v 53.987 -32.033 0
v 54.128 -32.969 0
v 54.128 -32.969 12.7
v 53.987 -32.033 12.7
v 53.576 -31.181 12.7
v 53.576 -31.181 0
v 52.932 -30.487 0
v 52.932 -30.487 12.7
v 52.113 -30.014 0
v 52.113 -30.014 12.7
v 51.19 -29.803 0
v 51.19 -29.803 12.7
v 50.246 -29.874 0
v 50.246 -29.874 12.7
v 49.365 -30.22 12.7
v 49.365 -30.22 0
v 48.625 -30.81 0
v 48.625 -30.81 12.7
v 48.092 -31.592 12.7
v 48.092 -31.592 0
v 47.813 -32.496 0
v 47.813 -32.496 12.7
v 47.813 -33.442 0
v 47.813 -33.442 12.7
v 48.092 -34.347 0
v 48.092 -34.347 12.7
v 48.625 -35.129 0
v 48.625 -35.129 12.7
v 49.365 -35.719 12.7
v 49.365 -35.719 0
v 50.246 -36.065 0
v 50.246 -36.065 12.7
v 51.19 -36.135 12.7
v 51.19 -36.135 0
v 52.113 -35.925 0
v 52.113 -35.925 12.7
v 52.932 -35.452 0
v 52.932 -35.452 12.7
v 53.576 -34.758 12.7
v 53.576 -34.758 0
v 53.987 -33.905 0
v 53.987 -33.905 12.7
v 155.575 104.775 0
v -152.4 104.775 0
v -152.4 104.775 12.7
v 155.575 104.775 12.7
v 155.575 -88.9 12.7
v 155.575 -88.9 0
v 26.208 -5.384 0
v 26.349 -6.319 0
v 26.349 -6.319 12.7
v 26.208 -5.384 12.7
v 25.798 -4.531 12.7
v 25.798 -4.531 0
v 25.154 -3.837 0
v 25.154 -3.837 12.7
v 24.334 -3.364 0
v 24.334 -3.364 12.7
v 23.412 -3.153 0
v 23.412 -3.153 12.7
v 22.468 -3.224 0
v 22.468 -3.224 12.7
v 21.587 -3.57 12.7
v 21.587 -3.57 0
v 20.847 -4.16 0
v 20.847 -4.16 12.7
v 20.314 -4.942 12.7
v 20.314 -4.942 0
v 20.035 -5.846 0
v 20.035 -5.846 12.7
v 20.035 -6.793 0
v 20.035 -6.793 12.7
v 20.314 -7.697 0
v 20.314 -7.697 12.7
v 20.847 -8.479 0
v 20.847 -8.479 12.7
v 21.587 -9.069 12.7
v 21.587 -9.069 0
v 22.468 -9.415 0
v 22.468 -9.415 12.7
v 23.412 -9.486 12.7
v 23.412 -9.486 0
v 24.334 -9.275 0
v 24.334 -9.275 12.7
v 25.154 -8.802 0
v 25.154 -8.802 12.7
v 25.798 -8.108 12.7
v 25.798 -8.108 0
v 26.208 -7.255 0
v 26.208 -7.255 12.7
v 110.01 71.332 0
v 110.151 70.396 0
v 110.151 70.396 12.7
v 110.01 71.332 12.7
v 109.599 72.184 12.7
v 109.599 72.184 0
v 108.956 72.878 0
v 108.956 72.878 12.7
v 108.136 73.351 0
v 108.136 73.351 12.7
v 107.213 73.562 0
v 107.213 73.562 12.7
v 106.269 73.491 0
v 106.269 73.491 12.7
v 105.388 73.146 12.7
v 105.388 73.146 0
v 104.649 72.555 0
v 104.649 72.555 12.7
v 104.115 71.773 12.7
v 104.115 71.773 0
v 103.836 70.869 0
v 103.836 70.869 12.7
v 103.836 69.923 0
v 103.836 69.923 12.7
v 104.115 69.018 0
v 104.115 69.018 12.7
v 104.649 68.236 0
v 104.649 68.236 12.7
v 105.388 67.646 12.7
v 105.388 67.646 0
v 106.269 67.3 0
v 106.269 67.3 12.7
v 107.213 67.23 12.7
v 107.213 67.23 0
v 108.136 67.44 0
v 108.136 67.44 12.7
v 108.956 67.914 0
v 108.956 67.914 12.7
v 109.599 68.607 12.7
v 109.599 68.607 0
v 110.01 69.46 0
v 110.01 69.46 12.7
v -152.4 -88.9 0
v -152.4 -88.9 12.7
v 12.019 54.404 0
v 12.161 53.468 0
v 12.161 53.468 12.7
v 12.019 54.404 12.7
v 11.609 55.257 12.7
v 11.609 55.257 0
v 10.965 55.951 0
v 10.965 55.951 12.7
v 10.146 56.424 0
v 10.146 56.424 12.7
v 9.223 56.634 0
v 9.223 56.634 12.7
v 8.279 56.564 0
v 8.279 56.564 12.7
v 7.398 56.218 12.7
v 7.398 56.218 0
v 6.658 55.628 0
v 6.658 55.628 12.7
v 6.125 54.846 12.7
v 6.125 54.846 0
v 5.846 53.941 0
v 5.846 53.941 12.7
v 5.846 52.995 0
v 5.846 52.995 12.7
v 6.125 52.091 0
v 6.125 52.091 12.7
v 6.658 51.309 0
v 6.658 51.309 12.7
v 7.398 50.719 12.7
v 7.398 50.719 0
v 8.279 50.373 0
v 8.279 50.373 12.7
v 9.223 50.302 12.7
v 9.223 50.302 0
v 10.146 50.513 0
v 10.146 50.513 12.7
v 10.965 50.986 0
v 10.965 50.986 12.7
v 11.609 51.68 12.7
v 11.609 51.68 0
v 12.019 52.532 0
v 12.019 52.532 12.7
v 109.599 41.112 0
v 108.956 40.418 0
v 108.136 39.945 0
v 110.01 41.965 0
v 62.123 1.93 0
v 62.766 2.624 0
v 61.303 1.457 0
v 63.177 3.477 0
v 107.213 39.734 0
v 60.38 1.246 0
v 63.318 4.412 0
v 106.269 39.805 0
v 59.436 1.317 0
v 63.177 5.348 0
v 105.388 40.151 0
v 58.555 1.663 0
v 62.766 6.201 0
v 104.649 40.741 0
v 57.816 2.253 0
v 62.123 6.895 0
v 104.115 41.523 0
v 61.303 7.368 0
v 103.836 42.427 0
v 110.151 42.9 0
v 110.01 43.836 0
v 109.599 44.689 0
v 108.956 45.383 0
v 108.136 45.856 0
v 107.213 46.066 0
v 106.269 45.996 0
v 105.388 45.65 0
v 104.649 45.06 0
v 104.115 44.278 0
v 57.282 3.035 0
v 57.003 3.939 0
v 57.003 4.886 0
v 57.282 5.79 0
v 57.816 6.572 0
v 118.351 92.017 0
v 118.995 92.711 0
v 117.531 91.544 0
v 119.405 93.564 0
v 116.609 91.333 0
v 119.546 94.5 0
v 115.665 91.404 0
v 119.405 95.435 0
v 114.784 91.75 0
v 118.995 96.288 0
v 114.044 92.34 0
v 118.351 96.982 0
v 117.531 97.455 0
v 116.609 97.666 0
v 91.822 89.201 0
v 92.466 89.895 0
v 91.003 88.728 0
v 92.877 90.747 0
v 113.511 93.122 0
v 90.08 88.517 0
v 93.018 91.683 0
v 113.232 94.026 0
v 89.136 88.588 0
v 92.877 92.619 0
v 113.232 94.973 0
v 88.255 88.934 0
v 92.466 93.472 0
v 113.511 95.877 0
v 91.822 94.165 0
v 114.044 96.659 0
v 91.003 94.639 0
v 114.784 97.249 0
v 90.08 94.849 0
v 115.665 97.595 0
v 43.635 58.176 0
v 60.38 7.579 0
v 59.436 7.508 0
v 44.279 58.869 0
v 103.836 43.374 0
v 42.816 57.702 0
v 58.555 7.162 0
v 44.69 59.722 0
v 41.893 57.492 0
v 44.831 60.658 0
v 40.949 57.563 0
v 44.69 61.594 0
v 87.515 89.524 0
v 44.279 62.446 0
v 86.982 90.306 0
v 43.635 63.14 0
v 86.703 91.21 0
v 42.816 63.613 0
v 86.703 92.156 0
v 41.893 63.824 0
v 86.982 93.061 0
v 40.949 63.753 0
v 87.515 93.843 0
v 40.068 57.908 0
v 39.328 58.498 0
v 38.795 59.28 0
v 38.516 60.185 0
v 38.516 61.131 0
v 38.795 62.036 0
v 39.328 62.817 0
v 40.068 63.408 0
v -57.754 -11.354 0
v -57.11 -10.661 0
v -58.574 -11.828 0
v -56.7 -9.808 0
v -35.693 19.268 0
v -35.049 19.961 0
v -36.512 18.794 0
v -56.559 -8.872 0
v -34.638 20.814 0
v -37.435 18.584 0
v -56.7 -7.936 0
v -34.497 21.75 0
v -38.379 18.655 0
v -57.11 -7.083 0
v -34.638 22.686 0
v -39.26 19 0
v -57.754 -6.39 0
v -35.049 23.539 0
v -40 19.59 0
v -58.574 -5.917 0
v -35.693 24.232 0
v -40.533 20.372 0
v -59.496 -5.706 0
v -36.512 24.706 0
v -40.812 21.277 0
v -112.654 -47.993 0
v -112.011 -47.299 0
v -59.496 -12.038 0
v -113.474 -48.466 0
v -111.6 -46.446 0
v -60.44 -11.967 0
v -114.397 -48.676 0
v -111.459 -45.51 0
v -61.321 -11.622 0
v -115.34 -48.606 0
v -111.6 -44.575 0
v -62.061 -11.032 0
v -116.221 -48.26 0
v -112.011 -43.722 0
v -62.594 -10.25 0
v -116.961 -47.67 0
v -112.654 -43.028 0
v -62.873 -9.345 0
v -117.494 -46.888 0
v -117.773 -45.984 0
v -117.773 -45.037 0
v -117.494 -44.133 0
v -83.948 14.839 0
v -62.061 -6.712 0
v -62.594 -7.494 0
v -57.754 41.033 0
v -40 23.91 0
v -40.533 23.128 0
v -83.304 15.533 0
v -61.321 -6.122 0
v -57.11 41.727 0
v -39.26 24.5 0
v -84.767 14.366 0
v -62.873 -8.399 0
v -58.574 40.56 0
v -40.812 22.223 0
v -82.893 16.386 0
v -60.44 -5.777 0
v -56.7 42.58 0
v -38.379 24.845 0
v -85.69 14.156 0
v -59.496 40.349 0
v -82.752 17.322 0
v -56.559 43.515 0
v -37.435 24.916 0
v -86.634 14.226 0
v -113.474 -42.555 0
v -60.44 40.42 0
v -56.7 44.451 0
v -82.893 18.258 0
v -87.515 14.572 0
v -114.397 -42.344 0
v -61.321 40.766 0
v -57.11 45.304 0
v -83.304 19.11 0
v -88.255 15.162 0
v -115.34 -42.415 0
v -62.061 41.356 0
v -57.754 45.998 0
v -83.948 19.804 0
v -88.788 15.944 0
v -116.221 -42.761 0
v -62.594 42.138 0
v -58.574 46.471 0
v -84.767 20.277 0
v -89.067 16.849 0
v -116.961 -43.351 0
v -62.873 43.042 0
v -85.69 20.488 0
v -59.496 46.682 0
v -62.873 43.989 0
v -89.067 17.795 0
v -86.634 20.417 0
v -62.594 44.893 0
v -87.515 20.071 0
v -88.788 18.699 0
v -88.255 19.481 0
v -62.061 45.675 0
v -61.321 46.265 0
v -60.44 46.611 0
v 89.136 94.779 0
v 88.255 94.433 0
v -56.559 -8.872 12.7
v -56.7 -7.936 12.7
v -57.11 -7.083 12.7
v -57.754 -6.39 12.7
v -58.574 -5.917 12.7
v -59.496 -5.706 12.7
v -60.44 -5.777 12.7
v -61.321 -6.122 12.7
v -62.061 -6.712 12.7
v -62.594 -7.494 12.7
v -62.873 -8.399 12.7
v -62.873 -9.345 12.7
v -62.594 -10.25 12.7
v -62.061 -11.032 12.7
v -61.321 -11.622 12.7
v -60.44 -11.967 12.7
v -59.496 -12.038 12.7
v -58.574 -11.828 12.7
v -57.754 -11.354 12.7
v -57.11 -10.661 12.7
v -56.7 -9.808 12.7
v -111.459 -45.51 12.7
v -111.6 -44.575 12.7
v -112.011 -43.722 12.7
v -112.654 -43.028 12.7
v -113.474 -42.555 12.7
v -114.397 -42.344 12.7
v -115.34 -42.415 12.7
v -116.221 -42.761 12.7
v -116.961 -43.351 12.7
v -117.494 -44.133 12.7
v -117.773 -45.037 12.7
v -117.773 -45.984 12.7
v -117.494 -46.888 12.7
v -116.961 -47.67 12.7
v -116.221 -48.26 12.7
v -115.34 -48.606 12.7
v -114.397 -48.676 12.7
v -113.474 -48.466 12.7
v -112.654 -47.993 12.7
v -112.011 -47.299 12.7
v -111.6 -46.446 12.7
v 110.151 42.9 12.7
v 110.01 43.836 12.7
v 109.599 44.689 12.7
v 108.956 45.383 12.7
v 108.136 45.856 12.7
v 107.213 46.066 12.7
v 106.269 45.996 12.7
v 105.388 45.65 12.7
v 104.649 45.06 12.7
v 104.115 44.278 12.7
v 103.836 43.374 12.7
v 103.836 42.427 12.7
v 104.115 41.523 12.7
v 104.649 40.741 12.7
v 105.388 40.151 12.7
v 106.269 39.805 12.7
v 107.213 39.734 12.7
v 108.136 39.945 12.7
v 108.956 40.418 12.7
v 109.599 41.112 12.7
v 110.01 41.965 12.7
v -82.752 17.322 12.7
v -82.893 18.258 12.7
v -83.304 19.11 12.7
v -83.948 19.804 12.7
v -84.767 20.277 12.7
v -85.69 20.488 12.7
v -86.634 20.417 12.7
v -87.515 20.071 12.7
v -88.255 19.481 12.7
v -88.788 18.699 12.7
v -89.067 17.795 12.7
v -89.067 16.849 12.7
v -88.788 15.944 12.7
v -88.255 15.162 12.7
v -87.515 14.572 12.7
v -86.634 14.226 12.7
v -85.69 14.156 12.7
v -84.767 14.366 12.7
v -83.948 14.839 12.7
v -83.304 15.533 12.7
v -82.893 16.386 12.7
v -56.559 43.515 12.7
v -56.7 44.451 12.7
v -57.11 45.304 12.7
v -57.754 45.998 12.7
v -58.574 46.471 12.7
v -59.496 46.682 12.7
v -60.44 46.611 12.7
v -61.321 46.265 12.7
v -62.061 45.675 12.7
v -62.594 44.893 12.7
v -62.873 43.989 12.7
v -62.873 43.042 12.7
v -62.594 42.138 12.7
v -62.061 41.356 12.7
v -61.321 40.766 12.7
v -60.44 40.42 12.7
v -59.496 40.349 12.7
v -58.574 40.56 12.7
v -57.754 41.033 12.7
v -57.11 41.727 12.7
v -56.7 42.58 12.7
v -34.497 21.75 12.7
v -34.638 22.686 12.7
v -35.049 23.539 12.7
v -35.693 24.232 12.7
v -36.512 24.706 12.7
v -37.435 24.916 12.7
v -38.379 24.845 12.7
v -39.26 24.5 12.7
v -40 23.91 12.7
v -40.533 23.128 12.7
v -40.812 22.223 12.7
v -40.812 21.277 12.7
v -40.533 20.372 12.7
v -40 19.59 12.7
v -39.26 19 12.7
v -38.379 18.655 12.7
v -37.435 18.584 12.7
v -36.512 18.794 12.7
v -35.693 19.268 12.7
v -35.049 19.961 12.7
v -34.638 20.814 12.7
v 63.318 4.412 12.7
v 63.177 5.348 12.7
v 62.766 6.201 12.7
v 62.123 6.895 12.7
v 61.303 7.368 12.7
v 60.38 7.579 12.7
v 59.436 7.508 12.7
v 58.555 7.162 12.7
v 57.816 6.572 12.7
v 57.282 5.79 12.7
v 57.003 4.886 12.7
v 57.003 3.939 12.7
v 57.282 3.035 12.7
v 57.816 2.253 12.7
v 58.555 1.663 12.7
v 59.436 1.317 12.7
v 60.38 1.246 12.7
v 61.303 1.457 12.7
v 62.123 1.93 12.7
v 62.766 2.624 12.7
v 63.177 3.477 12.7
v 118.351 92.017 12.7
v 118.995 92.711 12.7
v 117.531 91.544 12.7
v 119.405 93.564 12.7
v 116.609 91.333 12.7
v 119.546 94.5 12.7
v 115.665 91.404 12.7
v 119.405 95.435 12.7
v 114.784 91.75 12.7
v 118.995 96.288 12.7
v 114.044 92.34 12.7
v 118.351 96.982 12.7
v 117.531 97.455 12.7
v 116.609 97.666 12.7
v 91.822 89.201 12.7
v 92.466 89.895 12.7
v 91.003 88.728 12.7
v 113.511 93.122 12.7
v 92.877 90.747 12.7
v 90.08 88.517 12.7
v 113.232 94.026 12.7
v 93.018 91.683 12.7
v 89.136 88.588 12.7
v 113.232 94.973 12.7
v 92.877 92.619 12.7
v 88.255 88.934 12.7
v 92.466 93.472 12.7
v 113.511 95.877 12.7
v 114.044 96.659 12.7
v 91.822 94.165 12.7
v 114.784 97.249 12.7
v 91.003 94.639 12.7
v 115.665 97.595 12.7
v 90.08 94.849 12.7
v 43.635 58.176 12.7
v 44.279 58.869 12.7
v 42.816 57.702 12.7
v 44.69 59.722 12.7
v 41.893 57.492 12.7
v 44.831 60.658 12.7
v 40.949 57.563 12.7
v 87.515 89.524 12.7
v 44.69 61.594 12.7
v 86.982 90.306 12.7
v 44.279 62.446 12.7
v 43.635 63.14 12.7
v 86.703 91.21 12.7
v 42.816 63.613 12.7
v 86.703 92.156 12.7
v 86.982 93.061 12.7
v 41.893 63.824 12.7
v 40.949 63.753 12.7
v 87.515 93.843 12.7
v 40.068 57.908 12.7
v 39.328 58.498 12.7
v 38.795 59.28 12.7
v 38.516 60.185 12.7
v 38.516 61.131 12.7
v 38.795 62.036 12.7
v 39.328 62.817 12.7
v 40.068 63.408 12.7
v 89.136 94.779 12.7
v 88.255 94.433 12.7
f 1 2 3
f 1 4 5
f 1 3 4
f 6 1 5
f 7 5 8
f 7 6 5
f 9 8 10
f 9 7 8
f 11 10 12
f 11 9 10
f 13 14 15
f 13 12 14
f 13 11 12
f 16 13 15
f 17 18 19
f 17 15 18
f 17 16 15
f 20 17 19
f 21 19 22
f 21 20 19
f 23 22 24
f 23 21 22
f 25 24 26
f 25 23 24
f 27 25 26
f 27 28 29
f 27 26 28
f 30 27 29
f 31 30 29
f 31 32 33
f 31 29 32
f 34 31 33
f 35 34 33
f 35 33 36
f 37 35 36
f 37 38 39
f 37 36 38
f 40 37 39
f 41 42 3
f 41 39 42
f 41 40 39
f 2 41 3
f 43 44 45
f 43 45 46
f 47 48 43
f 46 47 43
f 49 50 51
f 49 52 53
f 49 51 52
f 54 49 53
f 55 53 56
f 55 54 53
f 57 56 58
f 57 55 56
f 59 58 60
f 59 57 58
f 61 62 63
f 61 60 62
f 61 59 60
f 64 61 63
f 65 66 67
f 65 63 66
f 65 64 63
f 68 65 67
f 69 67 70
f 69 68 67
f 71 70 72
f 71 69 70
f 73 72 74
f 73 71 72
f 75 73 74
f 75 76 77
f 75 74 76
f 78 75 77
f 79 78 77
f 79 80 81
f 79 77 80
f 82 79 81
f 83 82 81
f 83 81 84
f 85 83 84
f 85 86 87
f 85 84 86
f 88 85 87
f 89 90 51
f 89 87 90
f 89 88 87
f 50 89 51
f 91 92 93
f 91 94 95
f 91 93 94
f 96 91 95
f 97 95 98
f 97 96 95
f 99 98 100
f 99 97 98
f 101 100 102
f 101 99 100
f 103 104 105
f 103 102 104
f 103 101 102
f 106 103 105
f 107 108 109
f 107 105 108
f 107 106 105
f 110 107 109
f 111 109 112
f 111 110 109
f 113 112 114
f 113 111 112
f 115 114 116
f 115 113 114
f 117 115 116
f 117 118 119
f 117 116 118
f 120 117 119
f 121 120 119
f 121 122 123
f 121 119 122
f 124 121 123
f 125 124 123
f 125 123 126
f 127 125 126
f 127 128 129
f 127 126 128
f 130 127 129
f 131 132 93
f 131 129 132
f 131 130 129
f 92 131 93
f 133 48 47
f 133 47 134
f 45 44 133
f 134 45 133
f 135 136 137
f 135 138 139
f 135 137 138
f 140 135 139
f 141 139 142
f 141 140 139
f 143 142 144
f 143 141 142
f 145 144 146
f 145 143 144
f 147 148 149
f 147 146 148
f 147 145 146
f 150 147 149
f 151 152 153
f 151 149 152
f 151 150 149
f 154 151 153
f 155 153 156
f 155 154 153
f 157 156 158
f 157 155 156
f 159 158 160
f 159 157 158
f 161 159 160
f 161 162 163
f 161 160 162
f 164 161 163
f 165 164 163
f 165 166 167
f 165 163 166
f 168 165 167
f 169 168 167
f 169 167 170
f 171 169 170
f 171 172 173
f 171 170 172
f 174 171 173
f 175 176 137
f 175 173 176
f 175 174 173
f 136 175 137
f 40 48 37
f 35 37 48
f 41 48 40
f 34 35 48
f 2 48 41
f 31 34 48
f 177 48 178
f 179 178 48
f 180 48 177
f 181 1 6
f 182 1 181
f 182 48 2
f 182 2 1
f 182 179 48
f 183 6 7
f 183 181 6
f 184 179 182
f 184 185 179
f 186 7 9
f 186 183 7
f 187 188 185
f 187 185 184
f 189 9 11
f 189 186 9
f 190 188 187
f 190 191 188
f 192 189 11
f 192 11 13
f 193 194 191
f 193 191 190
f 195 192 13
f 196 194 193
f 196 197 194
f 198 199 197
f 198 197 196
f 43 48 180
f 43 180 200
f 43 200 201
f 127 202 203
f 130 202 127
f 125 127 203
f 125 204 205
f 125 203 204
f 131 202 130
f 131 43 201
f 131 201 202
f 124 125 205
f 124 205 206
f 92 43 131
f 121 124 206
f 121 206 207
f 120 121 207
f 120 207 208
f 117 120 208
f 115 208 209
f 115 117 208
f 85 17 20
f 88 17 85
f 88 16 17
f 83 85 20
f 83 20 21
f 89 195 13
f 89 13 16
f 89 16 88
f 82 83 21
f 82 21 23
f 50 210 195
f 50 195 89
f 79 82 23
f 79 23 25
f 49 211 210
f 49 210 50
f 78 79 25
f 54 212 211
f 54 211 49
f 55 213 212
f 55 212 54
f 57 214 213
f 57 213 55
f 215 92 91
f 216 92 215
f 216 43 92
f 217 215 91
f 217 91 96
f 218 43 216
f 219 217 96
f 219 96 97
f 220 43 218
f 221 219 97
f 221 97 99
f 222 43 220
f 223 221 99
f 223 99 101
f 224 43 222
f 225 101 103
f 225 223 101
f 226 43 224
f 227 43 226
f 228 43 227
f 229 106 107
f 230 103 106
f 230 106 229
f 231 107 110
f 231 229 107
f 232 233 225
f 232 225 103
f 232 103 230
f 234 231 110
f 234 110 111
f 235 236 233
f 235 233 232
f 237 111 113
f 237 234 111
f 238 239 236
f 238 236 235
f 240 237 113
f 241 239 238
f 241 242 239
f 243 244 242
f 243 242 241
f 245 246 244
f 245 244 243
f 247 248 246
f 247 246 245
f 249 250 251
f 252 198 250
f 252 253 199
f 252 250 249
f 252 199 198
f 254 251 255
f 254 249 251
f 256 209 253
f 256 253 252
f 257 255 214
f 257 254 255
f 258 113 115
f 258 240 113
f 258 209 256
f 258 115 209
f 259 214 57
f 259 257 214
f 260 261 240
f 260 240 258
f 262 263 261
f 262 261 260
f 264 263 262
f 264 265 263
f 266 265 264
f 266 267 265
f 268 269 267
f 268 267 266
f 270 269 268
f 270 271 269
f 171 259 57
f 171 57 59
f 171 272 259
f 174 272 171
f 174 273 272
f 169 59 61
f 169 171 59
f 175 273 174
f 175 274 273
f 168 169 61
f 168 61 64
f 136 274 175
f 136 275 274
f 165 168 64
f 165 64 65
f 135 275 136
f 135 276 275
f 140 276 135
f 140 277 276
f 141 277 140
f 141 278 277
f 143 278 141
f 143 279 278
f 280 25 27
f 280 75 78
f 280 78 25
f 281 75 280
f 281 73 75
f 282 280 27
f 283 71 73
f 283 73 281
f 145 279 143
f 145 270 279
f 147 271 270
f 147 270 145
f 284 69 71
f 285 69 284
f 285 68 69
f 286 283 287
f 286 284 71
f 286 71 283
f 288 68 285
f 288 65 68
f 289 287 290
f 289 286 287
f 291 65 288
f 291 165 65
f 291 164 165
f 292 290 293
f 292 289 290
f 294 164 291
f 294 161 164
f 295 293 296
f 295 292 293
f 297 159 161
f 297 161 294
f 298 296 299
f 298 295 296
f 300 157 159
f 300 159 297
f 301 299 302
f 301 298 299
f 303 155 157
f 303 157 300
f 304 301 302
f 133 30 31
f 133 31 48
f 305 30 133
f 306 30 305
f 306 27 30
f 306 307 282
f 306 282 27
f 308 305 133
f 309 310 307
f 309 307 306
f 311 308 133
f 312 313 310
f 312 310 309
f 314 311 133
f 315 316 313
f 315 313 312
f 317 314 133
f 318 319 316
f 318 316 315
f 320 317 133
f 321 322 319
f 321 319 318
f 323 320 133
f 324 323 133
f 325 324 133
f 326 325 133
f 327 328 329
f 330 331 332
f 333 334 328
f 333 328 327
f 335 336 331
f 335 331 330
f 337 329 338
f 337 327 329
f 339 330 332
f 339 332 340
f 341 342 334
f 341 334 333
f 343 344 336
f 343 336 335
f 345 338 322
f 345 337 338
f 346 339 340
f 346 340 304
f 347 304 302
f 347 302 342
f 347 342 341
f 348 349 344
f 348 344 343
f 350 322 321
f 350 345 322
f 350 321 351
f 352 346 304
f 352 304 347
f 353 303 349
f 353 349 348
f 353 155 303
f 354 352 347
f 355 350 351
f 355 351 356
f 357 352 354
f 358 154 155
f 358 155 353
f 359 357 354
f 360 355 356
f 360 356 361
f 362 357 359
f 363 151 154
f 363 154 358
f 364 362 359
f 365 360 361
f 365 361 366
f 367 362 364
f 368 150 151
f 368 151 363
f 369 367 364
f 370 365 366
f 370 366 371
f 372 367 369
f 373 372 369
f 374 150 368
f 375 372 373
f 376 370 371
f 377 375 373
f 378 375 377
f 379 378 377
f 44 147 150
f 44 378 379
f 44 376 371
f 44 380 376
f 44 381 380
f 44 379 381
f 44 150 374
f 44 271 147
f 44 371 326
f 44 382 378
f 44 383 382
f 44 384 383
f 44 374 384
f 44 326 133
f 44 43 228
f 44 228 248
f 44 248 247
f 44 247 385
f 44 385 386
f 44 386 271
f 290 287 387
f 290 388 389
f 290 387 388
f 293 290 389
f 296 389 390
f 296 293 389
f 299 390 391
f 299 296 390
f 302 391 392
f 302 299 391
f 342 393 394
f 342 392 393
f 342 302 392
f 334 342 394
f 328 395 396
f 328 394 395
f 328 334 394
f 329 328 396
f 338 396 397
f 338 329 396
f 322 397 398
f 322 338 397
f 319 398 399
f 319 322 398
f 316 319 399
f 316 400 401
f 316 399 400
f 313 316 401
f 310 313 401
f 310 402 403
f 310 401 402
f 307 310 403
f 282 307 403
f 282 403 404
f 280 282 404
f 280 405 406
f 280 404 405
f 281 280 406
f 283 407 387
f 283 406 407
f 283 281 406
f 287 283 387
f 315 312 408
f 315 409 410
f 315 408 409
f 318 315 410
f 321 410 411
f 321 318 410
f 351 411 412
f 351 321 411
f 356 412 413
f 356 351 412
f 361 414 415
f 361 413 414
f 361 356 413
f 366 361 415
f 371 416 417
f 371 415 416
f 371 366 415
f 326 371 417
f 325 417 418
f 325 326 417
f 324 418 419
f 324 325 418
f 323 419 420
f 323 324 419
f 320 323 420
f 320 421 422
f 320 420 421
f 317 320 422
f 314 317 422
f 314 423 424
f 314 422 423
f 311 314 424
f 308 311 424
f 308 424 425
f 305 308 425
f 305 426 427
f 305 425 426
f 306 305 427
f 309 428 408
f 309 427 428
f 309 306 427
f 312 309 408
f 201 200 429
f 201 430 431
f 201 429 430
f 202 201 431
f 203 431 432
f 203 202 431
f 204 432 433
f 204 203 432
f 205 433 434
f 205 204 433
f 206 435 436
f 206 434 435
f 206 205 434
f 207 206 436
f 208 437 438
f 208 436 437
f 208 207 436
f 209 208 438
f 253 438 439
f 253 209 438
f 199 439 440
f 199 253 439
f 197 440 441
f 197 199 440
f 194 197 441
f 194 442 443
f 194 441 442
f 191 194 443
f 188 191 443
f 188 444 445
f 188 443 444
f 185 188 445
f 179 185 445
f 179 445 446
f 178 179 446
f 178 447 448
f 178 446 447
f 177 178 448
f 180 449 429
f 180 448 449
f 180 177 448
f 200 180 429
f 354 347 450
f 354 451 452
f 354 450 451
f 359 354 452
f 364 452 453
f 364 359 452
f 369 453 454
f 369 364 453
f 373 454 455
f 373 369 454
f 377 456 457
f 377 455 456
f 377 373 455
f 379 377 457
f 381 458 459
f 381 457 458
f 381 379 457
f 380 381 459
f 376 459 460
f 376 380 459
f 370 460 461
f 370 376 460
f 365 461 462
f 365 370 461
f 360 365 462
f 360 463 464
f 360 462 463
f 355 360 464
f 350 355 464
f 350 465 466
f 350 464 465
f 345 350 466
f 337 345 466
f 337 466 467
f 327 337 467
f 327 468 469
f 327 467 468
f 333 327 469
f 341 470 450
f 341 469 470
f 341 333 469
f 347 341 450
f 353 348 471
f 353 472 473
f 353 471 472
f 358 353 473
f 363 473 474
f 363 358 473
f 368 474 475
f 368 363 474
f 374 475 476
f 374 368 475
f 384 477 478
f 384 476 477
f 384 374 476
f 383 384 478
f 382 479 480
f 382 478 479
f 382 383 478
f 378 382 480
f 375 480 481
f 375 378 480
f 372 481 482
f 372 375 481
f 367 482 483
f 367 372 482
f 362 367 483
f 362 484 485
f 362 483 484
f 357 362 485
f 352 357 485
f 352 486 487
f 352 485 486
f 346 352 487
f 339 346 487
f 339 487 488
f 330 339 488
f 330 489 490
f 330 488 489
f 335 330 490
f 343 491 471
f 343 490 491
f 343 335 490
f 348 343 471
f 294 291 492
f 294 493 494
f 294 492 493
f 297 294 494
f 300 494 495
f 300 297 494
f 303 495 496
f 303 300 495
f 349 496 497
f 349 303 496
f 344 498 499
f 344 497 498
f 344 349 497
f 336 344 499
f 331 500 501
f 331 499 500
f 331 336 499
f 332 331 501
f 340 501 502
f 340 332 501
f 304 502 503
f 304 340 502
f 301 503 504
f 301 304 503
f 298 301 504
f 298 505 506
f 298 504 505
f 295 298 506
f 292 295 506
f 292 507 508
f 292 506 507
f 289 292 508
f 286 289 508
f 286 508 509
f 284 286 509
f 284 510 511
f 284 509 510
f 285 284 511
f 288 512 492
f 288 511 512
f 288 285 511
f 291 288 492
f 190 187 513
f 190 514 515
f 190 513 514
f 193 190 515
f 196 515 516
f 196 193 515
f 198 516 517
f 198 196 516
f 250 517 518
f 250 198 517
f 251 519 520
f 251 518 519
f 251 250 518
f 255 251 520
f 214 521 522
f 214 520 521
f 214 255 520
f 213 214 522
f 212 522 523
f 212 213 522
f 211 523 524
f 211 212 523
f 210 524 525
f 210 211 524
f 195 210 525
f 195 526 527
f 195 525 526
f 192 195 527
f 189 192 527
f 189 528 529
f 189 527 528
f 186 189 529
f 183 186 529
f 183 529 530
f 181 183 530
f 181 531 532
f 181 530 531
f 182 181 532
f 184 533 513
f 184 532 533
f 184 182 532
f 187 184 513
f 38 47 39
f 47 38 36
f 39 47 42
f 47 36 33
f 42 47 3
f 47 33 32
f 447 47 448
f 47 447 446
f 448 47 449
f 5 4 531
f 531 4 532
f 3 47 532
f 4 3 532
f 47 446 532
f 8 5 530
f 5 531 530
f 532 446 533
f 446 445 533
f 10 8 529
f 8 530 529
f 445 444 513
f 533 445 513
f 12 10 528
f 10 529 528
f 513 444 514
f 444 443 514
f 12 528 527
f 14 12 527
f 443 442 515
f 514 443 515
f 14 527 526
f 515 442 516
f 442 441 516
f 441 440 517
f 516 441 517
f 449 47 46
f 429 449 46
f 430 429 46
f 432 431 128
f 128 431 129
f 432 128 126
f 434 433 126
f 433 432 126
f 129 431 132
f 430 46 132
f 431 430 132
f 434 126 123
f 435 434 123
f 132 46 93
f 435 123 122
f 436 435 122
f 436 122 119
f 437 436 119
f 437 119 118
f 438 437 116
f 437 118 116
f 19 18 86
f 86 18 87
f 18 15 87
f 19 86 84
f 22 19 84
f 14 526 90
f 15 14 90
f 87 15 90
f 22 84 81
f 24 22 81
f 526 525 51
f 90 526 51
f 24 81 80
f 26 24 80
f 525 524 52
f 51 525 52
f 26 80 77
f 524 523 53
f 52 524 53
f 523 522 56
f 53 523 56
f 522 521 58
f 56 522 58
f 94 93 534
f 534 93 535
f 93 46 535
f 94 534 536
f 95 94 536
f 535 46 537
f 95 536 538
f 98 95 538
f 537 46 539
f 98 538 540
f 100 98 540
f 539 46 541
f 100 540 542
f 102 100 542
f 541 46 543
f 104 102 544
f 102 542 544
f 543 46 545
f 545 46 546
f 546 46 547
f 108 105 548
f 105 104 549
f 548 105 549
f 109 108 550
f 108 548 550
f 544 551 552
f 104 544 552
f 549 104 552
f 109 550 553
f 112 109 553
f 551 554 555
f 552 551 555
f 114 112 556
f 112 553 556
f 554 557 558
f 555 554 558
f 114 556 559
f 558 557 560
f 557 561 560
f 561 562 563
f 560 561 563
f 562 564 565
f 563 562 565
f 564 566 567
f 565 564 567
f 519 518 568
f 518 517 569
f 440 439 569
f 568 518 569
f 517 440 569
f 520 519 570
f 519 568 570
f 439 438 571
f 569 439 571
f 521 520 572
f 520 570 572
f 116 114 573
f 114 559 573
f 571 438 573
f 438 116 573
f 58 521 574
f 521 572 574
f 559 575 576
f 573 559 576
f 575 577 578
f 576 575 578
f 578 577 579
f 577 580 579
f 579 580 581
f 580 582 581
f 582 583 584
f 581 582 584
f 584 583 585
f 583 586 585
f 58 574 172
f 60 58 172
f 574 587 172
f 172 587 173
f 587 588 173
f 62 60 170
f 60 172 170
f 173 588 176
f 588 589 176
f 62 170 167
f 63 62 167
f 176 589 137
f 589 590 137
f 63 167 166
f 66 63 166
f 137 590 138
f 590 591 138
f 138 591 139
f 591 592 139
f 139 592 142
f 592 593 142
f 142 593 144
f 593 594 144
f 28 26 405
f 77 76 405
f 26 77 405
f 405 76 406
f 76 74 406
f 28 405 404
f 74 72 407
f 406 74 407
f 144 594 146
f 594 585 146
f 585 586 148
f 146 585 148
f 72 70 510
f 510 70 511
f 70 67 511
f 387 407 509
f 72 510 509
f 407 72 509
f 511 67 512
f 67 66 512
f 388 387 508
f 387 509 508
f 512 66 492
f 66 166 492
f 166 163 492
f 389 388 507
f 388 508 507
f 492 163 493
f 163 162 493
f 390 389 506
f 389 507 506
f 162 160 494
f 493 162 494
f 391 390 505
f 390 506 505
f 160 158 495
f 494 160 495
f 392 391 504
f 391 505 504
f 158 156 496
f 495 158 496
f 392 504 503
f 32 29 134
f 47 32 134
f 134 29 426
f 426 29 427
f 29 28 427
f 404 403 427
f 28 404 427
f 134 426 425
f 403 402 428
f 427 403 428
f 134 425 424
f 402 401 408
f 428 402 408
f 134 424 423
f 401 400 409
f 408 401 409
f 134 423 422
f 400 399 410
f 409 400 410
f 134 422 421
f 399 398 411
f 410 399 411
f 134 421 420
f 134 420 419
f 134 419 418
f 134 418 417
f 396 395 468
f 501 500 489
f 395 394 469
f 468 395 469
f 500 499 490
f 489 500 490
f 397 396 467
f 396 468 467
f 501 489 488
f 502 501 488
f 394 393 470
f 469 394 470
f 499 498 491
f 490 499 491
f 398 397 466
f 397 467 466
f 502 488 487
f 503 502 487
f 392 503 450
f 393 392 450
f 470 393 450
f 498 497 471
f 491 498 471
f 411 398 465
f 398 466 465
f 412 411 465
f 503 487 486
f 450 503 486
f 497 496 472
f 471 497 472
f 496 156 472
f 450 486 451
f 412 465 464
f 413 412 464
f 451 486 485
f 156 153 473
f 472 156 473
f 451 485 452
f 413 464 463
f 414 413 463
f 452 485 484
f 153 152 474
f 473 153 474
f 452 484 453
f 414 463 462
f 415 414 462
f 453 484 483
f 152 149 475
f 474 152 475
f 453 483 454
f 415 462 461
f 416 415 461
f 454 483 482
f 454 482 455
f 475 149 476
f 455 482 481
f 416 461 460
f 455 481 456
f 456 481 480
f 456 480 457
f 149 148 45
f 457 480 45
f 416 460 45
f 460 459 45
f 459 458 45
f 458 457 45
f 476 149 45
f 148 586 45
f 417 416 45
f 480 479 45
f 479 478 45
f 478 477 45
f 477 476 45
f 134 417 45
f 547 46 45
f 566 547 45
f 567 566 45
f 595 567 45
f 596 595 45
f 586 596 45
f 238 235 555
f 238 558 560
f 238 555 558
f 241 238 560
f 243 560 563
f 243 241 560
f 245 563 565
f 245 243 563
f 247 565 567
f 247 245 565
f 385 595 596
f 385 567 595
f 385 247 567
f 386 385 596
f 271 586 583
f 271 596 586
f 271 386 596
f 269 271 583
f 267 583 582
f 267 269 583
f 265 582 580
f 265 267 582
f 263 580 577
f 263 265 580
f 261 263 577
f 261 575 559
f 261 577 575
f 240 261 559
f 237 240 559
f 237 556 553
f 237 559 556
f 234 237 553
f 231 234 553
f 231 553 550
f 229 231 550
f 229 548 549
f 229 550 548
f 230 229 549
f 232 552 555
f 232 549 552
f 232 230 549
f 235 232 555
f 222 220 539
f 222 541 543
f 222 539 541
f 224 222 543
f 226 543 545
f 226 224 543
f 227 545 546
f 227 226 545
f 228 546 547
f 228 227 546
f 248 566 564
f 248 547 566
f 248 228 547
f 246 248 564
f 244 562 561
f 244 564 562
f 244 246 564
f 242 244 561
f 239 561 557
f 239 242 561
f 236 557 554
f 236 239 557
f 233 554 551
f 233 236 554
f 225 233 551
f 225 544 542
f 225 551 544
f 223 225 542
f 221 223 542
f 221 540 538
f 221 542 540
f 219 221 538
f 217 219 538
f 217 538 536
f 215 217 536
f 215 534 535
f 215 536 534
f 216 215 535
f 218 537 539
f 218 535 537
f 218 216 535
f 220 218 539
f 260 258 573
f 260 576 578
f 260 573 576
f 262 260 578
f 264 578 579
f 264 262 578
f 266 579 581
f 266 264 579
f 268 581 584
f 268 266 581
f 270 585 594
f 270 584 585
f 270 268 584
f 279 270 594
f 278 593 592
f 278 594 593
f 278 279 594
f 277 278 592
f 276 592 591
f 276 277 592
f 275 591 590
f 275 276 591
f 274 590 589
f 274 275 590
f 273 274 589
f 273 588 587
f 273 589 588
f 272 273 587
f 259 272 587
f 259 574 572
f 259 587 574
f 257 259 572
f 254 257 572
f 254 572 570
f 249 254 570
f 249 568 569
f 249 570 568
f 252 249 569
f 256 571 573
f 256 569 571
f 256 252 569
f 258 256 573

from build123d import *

# Parameters (mm, degrees)
BOSS_EXTRUDE1_DEPTH     = 12.7
CUT_EXTRUDE1_DEPTH      = 188.996466057
CUT_EXTRUDE1_DEPTH_BACK = 188.996466057
SKETCH3_R               = 3.175


with BuildPart() as part:
    # Sketch1 → Boss-Extrude1 (new body)
    with BuildSketch(Plane.XY):
        Polygon((155.575, -88.9), (-152.4, -88.9), (-152.4, 0), (-152.4, 104.775), (155.575, 104.775), (155.575, 0), align=None)
    extrude(amount=BOSS_EXTRUDE1_DEPTH)

    # Sketch3 → Cut-Extrude1 (cut, two sides: drawn at the far end of the back side and taken through both)
    with BuildSketch(Plane.XY.offset(12.7).offset(-CUT_EXTRUDE1_DEPTH_BACK)):
        with Locations((106.975954286, 70.395873002)):
            Circle(SKETCH3_R)
        with Locations((106.975954286, 42.900373002)):
            Circle(SKETCH3_R)
        with Locations((-59.73361009, 43.51546635)):
            Circle(SKETCH3_R)
        with Locations((-59.73361009, -8.87203365)):
            Circle(SKETCH3_R)
        with Locations((-85.92736009, 17.32171635)):
            Circle(SKETCH3_R)
        with Locations((-114.633914907, -45.510351778)):
            Circle(SKETCH3_R)
        with Locations((8.985545702, 53.468225166)):
            Circle(SKETCH3_R)
        with Locations((41.65587457, 60.657920909)):
            Circle(SKETCH3_R)
        with Locations((60.142975062, 4.412421641)):
            Circle(SKETCH3_R)
        with Locations((50.952707496, -32.969269828)):
            Circle(SKETCH3_R)
        with Locations((23.174346831, -6.319418914)):
            Circle(SKETCH3_R)
        with Locations((-37.672139706, 21.75002)):
            Circle(SKETCH3_R)
        with Locations((89.842754417, 91.683154931)):
            Circle(SKETCH3_R)
        with Locations((116.371246163, 94.499523115)):
            Circle(SKETCH3_R)
    extrude(amount=CUT_EXTRUDE1_DEPTH + CUT_EXTRUDE1_DEPTH_BACK, mode=Mode.SUBTRACT)


solid = part.part
